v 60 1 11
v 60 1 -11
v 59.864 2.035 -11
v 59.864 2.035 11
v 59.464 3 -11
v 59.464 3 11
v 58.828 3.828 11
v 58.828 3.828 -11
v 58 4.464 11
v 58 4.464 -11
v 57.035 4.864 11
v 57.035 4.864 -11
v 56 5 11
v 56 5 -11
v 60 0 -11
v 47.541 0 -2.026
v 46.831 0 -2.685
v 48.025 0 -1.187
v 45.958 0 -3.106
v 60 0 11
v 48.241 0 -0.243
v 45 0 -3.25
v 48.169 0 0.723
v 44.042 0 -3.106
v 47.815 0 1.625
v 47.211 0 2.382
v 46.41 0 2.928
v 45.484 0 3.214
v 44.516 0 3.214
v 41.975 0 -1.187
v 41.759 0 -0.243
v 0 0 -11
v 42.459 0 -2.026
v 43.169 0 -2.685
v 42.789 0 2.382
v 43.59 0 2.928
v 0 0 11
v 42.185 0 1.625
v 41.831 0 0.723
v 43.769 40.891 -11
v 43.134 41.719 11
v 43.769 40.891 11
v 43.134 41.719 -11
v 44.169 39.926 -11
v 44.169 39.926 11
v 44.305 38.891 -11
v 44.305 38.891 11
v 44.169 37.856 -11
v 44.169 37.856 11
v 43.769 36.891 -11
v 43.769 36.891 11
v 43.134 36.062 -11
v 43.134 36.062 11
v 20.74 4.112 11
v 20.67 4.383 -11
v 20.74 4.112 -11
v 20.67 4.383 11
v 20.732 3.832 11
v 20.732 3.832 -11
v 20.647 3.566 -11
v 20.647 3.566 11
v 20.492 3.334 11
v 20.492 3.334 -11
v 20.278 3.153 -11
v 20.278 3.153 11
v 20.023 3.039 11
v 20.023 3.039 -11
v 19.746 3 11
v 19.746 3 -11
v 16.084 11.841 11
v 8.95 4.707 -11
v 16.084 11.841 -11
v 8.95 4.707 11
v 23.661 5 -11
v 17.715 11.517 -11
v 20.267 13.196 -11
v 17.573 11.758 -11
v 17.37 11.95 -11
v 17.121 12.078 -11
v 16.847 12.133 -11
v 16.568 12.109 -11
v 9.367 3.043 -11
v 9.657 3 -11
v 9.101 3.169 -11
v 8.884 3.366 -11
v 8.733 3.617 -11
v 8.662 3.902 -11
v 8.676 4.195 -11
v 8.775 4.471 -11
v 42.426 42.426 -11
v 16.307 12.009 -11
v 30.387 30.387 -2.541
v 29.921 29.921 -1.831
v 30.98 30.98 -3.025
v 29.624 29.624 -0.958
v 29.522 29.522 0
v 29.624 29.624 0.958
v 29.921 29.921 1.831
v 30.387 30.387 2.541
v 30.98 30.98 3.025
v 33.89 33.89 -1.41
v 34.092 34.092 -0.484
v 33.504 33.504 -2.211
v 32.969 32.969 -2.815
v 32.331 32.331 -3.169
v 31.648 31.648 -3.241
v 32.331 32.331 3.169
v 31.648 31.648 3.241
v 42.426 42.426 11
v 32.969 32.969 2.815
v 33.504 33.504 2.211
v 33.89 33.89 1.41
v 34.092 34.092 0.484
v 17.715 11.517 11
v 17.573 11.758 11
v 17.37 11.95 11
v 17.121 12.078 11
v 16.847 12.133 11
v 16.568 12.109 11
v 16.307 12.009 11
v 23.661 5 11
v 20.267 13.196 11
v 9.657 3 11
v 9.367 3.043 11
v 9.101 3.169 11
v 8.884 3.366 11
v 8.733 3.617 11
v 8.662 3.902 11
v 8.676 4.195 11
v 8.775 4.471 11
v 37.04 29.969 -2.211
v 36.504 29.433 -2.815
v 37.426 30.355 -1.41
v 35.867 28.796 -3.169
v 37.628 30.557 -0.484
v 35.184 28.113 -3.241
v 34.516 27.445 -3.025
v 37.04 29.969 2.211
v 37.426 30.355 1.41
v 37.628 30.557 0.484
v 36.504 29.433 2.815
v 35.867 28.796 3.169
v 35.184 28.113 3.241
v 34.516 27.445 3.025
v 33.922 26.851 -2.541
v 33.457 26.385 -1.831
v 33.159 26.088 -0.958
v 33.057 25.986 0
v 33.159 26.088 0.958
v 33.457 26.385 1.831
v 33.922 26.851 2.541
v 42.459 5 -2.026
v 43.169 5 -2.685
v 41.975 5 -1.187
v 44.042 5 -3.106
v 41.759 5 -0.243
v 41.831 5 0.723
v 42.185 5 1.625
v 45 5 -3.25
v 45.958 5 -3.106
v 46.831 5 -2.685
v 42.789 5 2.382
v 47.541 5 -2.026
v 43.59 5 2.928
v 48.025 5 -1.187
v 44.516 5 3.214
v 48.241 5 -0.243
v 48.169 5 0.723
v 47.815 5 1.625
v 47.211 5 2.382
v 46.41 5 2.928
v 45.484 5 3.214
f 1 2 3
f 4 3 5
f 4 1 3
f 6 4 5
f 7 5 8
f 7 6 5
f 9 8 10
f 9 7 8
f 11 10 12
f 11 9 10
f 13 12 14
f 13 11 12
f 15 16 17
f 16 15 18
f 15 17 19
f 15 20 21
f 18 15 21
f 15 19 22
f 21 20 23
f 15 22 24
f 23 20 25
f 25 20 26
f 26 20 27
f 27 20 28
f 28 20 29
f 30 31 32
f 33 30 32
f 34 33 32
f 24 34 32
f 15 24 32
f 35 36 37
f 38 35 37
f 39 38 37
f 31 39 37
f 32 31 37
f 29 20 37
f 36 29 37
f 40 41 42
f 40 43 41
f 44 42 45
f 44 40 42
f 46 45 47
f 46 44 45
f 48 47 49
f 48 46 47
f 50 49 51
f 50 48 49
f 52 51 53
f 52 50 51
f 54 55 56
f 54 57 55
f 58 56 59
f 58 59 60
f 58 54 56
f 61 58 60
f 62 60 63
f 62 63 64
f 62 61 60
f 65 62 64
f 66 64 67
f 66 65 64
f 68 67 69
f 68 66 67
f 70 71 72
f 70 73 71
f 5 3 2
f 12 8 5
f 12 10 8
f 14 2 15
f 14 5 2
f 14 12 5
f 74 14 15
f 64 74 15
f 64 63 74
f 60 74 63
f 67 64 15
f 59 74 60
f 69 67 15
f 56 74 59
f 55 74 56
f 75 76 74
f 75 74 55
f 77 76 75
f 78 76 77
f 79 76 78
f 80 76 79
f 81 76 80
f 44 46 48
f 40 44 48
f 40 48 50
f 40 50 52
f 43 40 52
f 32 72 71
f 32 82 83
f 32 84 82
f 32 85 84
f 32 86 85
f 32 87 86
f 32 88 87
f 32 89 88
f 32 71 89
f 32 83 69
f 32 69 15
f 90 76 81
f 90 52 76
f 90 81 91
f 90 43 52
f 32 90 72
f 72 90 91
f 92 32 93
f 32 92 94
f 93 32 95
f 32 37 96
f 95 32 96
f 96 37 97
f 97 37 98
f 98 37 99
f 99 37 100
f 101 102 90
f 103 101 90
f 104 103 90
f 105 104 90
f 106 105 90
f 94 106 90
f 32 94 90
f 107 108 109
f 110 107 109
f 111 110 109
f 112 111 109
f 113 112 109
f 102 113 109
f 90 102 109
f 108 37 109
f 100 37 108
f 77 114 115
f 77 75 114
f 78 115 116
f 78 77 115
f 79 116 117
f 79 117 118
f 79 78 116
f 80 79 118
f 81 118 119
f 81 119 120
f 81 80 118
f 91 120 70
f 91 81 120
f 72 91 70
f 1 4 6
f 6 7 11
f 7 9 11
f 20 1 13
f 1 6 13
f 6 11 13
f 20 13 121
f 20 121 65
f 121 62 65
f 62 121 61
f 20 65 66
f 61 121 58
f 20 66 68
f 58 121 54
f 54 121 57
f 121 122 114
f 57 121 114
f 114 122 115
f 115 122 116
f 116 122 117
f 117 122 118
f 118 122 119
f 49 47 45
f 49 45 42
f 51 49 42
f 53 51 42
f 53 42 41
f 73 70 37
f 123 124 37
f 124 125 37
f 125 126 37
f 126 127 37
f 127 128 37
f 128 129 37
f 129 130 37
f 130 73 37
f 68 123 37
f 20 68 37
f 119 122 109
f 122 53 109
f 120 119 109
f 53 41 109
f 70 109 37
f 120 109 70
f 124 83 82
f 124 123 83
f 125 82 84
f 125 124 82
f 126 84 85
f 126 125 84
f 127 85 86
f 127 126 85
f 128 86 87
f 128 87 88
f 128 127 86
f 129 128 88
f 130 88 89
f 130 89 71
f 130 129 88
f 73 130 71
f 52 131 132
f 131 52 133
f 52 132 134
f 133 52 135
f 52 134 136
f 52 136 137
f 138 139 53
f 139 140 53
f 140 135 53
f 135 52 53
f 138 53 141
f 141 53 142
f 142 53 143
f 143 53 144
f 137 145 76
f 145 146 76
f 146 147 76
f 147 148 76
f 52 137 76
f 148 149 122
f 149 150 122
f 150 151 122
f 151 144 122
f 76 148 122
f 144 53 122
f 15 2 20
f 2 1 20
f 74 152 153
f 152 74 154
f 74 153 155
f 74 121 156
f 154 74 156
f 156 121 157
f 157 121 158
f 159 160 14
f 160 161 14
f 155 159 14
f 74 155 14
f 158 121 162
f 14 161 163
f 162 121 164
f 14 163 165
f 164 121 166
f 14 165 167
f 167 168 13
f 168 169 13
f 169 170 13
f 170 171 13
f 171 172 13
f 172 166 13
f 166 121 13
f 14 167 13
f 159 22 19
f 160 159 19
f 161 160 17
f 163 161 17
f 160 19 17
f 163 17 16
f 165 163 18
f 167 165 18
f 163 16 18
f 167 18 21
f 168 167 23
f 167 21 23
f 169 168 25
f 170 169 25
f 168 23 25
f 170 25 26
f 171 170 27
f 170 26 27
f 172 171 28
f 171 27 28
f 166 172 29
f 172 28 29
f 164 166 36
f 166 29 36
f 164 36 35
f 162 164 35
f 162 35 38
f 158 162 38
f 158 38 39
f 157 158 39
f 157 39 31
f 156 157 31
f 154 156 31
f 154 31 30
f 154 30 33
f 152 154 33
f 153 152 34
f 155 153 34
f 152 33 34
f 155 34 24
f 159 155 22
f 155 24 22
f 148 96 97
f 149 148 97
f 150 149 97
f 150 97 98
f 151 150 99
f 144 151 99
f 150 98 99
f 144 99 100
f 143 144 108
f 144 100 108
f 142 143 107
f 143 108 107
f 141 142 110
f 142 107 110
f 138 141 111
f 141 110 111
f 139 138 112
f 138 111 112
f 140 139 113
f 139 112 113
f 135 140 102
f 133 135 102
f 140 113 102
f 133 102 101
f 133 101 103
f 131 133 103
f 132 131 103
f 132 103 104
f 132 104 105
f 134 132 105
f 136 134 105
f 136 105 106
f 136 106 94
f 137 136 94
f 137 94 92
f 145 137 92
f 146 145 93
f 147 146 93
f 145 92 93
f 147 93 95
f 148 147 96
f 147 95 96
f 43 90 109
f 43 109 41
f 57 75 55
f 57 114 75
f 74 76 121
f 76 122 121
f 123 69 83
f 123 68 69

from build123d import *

# Parameters (mm, degrees)
EXTRUDE_1_DEPTH     = 11
SKETCH_2_R          = 3.25
CUT_EXTRUDE_1_DEPTH = 5
SKETCH_3_R          = 3.25
CUT_EXTRUDE_2_DEPTH = 5
FILLET_1_R          = 4
FILLET_2_R          = 1


with BuildPart() as part:
    # Эскиз1 → Бобышка-Вытянуть1 (new body, symmetric)
    with BuildSketch(Plane.XY):
        Polygon((0, 0), (42.426406871, 42.426406871), (45.961940777, 38.890872965), (20.266663343, 13.195595531), (23.661390163, 5), (60, 5), (60, 0), align=None)
        Polygon((17.142135624, 12.899494937), (21.242640687, 3), (7.242640687, 3), align=None, mode=Mode.SUBTRACT)
    extrude(amount=EXTRUDE_1_DEPTH, both=True)

    # Эскиз2 → Вырез-Вытянуть1 (cut)
    with BuildSketch(Plane(origin=(0, 0, 0), x_dir=(0, 0, 1), z_dir=(-0.707106781, 0.707106781, 0))):
        with Locations(Location((0, 45, 0), (0, 0, 270))):  # turned: the seam where the file's is
            Circle(SKETCH_2_R)
    extrude(amount=-CUT_EXTRUDE_1_DEPTH, mode=Mode.SUBTRACT)

    # Эскиз3 → Вырез-Вытянуть2 (cut)
    with BuildSketch(Plane.XZ):
        with Locations(Location((45, 0, 0), (0, 0, 270))):  # turned: the seam where the file's is
            Circle(SKETCH_3_R)
    extrude(amount=-CUT_EXTRUDE_2_DEPTH, mode=Mode.SUBTRACT)

    # Скругление1
    fillet_1_edges = [part.edges().sort_by_distance(p)[0] for p in [
        (45.961940777, 38.890872965, 0),
        (60, 5, 0),
    ]]
    fillet(fillet_1_edges, radius=FILLET_1_R)

    # Скругление2
    fillet_2_edges = [part.edges().sort_by_distance(p)[0] for p in [
        (17.142135624, 12.899494937, 0),
        (7.242640687, 3, 0),
        (21.242640687, 3, 0),
    ]]
    fillet(fillet_2_edges, radius=FILLET_2_R)


solid = part.part
